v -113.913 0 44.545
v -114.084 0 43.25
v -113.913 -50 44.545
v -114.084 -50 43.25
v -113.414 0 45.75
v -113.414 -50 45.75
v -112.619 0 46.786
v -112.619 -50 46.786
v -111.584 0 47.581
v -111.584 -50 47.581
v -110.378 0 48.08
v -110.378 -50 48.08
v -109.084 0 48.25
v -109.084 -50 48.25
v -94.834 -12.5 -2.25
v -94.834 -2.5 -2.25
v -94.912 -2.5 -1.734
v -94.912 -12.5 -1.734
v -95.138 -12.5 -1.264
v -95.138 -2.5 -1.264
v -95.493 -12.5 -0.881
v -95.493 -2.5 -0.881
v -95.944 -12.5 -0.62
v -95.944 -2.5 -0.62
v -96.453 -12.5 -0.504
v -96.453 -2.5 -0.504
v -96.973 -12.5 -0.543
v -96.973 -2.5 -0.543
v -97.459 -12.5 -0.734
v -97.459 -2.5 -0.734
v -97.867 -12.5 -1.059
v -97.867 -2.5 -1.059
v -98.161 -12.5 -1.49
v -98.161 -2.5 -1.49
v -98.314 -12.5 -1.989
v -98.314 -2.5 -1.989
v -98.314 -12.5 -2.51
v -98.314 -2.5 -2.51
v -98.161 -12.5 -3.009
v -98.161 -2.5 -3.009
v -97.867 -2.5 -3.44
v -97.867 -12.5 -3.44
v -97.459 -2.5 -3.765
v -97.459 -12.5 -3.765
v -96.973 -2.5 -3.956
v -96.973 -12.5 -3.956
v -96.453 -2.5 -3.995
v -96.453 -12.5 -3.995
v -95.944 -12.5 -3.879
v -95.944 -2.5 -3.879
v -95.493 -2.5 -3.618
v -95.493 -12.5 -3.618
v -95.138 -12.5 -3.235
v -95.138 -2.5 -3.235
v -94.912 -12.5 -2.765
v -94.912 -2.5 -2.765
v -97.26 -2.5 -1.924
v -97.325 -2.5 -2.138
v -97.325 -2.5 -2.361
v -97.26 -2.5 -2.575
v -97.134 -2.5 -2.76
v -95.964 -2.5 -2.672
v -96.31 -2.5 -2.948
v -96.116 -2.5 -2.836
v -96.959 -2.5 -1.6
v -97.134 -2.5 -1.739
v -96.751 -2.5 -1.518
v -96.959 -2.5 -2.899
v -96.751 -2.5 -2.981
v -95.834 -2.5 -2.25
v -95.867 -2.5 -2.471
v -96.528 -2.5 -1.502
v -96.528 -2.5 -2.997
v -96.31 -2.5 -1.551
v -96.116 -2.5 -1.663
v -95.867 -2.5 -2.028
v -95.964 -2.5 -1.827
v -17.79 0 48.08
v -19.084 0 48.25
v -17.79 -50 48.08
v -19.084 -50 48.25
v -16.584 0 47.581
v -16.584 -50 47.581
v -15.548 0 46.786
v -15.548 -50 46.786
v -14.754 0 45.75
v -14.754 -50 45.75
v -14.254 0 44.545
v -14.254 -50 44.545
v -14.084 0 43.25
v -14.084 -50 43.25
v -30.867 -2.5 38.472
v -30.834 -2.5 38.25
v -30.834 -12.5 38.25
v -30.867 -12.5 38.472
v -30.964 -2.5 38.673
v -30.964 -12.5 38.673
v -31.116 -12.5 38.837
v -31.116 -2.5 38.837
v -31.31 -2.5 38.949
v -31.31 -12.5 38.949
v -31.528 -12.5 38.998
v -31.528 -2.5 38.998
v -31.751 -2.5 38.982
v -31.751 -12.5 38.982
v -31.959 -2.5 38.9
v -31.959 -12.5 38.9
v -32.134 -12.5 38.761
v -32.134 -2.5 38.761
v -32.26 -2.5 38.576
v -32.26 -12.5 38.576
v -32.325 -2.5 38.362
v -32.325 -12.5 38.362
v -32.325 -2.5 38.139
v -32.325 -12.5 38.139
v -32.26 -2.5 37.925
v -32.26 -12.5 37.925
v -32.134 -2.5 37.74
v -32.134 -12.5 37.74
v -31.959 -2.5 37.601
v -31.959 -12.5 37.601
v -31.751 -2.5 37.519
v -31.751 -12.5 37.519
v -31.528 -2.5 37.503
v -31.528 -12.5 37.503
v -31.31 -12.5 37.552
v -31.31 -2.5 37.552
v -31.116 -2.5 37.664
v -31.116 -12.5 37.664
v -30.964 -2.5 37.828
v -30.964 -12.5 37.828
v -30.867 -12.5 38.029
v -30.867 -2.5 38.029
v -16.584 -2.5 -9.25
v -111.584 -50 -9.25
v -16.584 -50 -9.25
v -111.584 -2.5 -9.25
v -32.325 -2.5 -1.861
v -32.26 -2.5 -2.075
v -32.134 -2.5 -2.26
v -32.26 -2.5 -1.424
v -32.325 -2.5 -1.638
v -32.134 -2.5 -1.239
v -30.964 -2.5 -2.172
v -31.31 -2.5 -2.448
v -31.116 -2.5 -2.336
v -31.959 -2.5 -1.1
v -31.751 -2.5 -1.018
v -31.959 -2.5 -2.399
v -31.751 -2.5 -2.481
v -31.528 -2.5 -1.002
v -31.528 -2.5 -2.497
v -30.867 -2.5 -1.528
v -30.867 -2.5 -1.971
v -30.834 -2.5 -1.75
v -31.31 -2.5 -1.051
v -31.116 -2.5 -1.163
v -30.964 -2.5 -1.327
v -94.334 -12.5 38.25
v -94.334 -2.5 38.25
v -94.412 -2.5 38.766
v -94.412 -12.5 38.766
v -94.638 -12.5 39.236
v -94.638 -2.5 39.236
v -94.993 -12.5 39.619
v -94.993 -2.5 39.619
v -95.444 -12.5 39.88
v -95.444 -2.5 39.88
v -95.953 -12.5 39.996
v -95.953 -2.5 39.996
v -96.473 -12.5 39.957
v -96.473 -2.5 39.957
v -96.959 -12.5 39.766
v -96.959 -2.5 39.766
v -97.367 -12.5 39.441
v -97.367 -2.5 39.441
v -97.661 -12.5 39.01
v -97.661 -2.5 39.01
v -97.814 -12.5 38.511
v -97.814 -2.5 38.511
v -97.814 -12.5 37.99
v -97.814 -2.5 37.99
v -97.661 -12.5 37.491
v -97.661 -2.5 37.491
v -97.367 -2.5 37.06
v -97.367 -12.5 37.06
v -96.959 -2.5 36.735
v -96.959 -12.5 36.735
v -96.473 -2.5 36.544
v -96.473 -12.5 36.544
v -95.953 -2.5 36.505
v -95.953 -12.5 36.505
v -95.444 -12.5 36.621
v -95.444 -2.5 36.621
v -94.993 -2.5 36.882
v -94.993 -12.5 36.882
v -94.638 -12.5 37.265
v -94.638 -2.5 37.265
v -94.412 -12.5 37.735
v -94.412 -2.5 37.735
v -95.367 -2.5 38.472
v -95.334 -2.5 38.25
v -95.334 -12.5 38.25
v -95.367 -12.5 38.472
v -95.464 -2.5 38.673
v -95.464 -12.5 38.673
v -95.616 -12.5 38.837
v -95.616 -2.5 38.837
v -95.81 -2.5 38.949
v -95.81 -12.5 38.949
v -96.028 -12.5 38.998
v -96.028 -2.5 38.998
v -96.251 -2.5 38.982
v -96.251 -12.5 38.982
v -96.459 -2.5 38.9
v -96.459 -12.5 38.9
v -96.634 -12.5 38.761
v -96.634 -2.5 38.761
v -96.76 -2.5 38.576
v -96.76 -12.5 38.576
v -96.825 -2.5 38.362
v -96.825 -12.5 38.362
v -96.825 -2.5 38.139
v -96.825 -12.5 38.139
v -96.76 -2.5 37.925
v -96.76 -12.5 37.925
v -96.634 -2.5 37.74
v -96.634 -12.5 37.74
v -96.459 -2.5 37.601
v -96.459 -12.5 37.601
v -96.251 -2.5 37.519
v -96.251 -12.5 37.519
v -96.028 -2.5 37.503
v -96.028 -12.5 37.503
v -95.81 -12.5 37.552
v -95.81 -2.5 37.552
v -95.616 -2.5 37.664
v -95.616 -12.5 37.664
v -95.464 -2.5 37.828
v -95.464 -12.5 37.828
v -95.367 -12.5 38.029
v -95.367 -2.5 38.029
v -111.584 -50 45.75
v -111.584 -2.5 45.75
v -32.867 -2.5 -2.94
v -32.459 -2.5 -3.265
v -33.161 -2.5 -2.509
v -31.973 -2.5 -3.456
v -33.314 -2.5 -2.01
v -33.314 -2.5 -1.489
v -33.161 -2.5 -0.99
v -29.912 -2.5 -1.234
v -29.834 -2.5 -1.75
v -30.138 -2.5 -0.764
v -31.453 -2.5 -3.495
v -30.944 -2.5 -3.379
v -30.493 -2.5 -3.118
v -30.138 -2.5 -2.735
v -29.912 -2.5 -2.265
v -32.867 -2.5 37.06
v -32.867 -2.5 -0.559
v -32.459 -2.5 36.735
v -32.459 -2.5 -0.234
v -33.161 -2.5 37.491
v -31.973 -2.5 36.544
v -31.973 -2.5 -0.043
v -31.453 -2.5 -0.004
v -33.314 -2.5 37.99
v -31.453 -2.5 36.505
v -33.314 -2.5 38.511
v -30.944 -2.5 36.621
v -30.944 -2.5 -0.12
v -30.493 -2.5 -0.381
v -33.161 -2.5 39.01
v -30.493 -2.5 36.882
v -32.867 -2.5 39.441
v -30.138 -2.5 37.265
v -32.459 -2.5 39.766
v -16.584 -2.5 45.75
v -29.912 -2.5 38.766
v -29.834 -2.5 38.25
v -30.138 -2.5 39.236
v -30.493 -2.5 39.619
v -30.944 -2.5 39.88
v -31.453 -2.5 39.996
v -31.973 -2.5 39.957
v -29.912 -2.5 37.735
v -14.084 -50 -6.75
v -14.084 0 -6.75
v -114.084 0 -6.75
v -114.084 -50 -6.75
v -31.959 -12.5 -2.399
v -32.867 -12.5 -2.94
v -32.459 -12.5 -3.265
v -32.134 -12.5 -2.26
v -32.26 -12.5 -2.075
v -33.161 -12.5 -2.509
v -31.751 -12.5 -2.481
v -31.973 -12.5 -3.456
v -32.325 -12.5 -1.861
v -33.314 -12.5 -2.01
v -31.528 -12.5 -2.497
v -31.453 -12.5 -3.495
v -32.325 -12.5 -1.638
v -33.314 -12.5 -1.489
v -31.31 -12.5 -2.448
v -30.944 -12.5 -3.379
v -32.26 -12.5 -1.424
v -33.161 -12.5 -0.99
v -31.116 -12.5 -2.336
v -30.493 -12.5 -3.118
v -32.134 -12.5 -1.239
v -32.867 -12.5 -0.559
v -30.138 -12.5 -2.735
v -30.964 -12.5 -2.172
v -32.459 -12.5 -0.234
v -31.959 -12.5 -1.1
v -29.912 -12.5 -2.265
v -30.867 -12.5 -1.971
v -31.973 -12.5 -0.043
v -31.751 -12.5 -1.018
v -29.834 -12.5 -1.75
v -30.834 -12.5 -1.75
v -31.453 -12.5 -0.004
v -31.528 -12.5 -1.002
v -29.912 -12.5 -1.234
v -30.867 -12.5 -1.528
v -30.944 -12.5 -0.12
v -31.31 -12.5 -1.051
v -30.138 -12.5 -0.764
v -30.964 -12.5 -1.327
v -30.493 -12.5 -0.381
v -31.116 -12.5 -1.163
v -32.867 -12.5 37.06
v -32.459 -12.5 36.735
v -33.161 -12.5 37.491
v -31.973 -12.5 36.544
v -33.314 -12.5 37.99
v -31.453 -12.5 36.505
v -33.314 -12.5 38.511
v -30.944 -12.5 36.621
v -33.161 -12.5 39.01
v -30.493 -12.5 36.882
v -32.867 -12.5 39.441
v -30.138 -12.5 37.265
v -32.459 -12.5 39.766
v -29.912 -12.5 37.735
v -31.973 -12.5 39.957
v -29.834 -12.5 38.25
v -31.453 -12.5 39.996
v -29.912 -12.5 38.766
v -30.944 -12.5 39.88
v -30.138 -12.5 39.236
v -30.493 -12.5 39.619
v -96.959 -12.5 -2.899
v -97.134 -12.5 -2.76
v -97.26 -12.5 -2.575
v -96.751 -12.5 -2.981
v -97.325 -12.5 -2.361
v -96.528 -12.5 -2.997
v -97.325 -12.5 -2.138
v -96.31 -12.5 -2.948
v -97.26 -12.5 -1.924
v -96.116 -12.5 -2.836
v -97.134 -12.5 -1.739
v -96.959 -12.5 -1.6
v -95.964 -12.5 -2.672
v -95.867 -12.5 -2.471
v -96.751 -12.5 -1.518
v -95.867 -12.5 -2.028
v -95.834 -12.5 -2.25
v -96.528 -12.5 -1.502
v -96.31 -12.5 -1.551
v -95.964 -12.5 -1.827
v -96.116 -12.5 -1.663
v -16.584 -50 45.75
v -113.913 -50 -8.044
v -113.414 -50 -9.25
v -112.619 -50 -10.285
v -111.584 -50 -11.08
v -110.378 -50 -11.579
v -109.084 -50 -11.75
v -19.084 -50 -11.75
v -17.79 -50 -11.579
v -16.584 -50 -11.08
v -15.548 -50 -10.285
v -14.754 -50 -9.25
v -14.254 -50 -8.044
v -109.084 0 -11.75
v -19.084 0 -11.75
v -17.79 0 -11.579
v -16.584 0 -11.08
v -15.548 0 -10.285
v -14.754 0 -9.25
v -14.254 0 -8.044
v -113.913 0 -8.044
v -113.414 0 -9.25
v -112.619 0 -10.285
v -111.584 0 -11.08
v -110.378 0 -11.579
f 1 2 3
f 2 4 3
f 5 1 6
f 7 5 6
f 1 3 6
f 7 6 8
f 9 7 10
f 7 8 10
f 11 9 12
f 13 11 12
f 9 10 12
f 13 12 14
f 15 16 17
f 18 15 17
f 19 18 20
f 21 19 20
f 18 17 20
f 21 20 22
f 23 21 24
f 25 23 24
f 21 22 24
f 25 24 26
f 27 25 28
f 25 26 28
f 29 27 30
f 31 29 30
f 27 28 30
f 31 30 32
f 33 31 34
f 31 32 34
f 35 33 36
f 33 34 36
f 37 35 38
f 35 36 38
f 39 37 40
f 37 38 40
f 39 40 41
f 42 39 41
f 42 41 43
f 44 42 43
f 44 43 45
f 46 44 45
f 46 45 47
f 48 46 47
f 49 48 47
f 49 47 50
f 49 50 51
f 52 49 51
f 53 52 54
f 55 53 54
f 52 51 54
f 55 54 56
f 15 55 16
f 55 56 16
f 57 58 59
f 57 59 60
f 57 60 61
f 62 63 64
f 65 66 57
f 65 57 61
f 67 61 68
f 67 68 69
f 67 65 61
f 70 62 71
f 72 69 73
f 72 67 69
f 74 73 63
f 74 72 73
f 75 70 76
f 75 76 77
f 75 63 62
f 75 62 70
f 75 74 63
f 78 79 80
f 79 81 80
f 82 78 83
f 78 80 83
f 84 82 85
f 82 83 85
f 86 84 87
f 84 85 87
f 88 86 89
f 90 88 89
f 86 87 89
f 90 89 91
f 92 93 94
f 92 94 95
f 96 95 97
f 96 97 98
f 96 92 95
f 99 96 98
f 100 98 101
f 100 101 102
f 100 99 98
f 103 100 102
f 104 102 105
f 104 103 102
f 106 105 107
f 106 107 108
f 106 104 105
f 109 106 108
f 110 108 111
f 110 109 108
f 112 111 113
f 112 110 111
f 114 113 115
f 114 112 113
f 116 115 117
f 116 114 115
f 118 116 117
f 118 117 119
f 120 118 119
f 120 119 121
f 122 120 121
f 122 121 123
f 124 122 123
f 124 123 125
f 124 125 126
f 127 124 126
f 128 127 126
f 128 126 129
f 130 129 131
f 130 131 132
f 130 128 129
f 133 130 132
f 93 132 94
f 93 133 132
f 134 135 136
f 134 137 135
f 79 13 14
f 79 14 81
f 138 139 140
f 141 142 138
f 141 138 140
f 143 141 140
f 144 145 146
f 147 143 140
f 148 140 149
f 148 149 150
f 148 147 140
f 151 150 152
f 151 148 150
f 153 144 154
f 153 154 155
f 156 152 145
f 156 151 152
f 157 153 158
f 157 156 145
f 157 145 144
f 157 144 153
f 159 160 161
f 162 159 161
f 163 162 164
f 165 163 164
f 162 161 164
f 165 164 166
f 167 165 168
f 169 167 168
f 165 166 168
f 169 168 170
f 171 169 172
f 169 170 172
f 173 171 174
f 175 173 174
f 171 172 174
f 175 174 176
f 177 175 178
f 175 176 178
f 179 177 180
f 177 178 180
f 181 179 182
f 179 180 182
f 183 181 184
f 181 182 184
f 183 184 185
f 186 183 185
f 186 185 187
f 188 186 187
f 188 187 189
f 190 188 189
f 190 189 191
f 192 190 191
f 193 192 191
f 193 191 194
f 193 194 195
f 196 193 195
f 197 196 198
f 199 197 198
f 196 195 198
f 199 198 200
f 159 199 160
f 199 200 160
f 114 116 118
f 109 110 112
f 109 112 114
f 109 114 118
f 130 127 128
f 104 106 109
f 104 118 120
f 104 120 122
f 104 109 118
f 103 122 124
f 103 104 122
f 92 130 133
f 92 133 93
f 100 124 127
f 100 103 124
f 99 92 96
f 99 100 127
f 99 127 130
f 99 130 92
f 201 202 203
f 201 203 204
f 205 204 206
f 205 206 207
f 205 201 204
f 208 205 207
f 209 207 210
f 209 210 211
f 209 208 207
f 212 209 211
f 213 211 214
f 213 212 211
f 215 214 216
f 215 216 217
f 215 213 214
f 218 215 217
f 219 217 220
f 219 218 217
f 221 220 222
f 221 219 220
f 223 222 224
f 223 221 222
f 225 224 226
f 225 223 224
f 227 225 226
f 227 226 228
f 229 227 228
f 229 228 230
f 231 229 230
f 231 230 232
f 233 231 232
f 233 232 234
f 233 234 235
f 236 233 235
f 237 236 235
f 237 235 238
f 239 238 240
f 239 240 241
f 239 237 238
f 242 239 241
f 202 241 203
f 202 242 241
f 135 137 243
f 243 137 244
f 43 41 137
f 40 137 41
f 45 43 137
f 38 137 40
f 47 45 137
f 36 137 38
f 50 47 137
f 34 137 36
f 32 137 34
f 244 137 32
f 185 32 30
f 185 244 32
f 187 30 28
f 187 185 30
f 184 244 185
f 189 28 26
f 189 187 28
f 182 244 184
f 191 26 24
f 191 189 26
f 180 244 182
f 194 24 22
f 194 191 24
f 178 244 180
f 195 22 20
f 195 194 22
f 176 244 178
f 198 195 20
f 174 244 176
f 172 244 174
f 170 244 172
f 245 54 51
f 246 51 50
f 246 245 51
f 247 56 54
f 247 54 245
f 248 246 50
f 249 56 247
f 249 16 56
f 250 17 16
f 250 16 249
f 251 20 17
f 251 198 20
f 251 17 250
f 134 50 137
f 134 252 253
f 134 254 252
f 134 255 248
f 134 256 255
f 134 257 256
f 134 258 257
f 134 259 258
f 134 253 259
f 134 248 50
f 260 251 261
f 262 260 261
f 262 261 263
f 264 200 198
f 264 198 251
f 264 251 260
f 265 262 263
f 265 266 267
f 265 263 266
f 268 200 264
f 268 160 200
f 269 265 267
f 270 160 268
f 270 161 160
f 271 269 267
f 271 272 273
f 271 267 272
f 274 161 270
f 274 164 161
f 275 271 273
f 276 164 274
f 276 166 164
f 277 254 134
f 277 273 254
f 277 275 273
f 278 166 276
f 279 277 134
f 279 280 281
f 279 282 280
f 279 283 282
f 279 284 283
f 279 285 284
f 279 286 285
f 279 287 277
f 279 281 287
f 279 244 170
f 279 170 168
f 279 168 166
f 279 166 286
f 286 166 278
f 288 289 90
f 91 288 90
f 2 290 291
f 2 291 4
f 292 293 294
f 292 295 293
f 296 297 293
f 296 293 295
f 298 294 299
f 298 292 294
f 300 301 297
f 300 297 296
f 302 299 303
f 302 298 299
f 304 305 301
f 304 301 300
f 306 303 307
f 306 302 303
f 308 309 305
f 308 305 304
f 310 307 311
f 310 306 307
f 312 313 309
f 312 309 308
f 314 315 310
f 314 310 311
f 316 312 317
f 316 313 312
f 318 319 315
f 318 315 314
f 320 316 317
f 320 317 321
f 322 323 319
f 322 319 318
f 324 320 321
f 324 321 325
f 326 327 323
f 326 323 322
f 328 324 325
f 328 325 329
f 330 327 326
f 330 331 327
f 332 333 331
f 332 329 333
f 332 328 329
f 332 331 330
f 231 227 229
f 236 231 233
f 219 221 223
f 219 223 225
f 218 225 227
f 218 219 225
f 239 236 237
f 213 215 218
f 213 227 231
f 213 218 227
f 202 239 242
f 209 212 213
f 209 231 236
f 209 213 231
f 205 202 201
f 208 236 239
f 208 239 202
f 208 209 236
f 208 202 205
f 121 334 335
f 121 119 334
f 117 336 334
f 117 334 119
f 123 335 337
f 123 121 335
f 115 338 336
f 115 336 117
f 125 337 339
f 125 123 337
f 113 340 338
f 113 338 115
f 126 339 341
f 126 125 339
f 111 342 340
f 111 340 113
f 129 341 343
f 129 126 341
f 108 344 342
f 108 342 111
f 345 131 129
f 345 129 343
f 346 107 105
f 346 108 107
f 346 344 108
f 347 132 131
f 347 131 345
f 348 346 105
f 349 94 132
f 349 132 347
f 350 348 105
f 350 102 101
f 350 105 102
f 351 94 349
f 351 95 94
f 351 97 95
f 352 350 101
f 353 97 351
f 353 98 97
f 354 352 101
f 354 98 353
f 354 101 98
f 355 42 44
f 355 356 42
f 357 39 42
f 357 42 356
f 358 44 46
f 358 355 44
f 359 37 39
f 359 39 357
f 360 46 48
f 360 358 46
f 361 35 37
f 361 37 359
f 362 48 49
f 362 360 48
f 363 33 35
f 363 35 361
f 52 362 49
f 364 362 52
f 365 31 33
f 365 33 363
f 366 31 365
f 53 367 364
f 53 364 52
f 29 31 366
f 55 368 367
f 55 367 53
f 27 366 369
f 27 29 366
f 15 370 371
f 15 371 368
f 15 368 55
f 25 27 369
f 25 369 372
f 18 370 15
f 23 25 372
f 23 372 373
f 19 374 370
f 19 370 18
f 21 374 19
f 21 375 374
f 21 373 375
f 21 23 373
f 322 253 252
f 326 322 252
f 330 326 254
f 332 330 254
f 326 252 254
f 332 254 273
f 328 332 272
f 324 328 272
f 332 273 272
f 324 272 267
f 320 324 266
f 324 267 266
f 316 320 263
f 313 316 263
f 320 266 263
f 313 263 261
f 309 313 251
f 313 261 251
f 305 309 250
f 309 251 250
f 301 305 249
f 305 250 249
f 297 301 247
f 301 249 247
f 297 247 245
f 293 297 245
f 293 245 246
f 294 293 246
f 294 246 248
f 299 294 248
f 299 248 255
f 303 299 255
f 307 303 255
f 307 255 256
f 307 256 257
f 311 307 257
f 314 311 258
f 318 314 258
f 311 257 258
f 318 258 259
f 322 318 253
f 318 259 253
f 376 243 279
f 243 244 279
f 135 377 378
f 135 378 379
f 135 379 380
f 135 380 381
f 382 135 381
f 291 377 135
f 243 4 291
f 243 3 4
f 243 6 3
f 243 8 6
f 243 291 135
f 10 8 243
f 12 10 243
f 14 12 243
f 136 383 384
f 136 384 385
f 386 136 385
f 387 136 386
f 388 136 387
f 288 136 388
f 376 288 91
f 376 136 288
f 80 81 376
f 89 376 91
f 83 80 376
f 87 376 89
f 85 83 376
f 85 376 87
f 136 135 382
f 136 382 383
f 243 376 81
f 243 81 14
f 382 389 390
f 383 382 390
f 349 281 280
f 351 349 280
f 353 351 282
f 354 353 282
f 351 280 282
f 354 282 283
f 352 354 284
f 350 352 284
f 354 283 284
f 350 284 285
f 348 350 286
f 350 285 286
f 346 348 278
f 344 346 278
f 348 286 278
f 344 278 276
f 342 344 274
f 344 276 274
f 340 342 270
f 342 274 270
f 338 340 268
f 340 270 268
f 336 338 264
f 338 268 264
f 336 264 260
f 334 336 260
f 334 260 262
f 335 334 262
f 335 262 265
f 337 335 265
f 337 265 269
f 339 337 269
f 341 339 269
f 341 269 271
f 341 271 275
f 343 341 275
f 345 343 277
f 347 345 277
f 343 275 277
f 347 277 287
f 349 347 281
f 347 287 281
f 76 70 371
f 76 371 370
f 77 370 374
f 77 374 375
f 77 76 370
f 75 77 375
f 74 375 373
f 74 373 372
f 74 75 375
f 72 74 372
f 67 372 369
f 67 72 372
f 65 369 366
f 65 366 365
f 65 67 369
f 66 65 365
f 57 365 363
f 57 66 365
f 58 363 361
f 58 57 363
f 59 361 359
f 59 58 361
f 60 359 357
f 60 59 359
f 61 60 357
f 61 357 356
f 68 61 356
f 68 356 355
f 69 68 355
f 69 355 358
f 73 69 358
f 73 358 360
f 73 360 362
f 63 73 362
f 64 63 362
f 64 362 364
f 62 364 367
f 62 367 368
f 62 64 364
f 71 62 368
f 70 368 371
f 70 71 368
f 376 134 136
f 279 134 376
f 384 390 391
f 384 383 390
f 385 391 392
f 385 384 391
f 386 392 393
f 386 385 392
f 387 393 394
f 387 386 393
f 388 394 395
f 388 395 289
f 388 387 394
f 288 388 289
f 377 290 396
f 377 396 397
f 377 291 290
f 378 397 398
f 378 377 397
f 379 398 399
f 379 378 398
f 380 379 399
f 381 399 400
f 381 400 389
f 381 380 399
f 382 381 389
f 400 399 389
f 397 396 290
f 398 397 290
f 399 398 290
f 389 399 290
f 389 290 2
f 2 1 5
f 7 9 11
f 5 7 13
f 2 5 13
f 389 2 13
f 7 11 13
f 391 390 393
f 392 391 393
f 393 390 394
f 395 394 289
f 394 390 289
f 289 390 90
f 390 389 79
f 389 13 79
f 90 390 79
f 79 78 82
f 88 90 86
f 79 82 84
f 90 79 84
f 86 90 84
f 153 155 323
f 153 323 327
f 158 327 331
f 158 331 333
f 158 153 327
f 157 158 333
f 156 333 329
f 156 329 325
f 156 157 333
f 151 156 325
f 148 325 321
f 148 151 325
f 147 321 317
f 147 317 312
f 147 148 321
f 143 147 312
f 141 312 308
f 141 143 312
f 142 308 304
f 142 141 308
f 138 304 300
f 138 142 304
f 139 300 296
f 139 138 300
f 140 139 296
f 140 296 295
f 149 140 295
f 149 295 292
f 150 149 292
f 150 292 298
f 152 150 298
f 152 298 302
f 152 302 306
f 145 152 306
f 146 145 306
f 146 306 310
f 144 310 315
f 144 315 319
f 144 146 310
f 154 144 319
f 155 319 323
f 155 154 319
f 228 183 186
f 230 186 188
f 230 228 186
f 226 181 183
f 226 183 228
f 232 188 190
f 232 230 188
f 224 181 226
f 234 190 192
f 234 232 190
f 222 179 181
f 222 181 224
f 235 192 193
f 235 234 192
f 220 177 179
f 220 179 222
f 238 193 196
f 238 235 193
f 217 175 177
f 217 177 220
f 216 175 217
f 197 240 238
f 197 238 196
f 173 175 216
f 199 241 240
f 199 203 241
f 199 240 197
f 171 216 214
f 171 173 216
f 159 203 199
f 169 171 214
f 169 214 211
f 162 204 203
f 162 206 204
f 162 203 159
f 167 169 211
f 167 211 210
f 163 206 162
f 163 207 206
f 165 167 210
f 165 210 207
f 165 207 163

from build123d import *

# Parameters (mm, degrees)
F0_W     = 100
F0_H     = 60
F1_DEPTH = 50
F2_T     = -2.5
F3_R     = 1.75
F3_R_2   = 0.75
F4_DEPTH = 10
F5_R     = 5


with BuildPart() as f1:
    # F0 (on Front) → F1 (new body)
    with BuildSketch(Plane.XZ):
        with Locations((-64.083846, 18.250474)):
            Rectangle(F0_W, F0_H)
    extrude(amount=F1_DEPTH)

    # F2
    f2_openings = [f1.faces().sort_by_distance(p)[0] for p in [
        (-64.083846, -50, 18.250474),
    ]]
    offset(amount=F2_T, openings=f2_openings)

    # F3 (on face) → F4 (join)
    with BuildSketch(Plane.XZ.offset(2.5)):
        with Locations((-96.083846, 38.250474)):
            Circle(F3_R)
        with Locations((-96.083846, 38.250474)):
            Circle(F3_R_2, mode=Mode.SUBTRACT)
        with Locations((-31.583846, 38.250474)):
            Circle(F3_R)
        with Locations((-31.583846, 38.250474)):
            Circle(F3_R_2, mode=Mode.SUBTRACT)
        with Locations((-96.583846, -2.249526)):
            Circle(F3_R)
        with Locations((-96.583846, -2.249526)):
            Circle(F3_R_2, mode=Mode.SUBTRACT)
        with Locations((-31.583846, -1.749526)):
            Circle(F3_R)
        with Locations((-31.583846, -1.749526)):
            Circle(F3_R_2, mode=Mode.SUBTRACT)
    extrude(amount=F4_DEPTH)

    # F5
    f5_edges = [f1.edges().sort_by_distance(p)[0] for p in [
        (-114.083846, -25, 48.250474),
        (-114.083846, -25, -11.749526),
        (-14.083846, -25, -11.749526),
        (-14.083846, -25, 48.250474),
    ]]
    fillet(f5_edges, radius=F5_R)


solid = f1.part
